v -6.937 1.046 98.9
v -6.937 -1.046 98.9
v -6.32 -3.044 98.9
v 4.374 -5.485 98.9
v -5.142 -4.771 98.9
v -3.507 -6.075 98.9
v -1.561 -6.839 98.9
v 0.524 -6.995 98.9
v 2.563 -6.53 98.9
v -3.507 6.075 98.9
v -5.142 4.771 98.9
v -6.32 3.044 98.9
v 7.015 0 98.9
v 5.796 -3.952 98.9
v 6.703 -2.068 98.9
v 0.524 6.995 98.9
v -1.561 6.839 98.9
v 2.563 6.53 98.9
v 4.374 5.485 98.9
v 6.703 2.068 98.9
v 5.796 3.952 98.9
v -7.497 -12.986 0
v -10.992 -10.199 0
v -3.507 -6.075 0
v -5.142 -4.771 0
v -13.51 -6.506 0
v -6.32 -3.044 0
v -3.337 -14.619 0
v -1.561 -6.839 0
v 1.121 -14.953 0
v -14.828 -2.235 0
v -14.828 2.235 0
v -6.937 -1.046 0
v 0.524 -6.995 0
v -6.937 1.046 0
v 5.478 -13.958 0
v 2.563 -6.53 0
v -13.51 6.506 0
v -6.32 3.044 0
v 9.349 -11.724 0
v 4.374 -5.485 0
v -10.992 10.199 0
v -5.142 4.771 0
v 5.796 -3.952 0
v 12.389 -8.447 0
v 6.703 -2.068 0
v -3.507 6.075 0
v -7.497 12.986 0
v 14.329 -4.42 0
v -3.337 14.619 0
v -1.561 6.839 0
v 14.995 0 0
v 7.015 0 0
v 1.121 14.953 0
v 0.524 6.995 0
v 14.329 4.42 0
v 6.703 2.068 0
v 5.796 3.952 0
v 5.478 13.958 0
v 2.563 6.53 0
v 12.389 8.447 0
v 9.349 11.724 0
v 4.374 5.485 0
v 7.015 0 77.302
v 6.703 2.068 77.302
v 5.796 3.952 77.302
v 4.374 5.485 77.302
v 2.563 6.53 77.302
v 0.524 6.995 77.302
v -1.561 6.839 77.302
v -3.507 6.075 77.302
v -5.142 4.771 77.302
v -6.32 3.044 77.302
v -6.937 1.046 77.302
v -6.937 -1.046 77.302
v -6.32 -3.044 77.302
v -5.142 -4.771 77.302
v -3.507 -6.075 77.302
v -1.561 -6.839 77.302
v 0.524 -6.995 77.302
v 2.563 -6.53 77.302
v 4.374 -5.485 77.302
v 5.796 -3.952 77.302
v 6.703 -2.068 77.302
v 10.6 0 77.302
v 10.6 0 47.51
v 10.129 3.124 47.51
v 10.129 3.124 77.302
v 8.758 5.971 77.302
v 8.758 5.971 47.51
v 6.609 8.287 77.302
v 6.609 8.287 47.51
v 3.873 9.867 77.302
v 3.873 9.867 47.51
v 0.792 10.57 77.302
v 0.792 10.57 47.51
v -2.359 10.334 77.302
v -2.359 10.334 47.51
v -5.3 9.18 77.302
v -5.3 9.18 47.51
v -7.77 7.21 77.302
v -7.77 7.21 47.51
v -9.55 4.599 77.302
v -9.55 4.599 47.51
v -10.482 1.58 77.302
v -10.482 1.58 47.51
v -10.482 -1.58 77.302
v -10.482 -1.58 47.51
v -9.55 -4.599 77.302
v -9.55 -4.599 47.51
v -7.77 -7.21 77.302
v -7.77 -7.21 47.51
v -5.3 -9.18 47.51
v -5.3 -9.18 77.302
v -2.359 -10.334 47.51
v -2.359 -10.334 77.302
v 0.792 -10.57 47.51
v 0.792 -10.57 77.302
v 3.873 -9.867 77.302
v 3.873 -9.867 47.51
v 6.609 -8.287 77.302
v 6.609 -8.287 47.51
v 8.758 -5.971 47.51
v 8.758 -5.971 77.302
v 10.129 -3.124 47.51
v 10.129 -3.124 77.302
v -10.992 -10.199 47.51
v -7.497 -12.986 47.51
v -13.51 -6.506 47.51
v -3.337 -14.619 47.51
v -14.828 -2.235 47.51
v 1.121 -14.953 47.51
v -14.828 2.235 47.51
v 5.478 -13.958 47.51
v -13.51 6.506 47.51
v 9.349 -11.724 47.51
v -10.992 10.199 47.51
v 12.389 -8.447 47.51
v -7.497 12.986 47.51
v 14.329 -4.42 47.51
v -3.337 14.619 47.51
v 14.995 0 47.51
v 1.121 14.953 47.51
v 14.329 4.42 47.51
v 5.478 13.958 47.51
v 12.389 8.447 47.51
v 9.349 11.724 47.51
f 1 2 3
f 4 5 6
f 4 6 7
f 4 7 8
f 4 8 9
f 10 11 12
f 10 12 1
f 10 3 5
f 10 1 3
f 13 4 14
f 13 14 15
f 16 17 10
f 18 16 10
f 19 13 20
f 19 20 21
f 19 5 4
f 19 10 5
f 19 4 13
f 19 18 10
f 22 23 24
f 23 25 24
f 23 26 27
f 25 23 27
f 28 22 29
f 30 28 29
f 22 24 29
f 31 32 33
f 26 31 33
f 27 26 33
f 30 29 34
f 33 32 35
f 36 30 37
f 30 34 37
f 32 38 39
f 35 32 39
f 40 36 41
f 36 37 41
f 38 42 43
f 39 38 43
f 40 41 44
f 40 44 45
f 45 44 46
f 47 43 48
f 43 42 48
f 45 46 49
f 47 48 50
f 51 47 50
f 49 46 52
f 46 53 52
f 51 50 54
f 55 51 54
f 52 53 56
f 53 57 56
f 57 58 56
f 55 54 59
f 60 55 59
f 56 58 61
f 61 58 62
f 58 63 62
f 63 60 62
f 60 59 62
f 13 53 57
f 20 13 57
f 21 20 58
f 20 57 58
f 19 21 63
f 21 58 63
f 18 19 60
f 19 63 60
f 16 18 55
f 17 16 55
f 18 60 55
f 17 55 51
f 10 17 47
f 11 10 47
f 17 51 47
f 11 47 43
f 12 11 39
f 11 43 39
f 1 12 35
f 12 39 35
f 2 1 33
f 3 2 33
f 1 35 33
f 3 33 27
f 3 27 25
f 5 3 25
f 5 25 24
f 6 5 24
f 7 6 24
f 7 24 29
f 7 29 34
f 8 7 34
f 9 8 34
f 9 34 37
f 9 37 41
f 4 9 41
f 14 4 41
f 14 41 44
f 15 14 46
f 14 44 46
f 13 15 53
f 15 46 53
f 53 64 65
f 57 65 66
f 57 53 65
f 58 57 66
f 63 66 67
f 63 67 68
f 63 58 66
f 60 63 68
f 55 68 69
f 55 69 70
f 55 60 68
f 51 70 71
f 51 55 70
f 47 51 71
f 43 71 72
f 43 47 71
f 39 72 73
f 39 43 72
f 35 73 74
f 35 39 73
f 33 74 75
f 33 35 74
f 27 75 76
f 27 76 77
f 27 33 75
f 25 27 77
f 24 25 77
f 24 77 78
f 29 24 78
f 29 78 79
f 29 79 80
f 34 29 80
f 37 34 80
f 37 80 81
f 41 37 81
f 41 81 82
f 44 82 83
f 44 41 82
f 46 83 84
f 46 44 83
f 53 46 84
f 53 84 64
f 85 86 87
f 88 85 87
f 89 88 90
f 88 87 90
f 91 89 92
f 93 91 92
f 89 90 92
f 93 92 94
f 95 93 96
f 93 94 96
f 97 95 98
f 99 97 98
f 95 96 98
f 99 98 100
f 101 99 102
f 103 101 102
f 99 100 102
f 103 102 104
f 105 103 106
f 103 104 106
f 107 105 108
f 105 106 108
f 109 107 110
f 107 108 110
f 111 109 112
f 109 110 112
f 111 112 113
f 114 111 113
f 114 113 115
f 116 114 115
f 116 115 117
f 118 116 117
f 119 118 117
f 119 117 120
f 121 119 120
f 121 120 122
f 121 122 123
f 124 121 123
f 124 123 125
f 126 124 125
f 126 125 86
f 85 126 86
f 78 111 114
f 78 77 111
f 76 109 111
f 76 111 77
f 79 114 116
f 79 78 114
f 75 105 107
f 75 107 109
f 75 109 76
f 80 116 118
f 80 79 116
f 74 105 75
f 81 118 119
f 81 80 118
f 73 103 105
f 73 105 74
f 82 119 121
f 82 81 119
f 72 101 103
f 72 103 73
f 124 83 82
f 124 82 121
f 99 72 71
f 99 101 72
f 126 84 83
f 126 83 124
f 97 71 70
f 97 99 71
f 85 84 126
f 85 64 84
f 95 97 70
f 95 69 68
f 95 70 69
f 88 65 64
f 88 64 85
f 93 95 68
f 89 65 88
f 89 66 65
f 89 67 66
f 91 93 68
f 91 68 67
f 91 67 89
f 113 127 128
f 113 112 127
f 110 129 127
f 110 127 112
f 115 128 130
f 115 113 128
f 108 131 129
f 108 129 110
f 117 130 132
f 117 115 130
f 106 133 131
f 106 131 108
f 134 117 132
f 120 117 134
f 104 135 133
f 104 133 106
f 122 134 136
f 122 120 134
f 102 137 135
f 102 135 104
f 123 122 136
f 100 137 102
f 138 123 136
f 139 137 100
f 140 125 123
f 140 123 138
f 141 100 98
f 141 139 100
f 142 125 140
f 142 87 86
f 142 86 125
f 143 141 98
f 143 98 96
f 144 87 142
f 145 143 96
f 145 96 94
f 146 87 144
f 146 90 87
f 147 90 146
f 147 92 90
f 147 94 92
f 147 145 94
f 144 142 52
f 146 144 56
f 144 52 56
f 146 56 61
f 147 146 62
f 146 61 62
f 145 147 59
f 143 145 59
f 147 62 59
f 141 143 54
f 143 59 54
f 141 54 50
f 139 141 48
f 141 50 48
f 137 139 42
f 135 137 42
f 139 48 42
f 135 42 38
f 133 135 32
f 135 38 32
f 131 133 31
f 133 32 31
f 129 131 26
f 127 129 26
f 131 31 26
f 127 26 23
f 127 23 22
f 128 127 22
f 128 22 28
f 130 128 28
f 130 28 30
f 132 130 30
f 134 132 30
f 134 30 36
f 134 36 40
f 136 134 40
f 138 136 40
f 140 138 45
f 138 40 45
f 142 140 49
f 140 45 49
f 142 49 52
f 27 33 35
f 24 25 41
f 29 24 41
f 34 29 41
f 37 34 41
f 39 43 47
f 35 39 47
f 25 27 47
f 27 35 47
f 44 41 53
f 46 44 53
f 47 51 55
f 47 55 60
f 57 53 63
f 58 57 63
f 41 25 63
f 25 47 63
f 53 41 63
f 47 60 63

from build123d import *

# Parameters (mm, degrees)
F0_R     = 14.9949916
F0_R_2   = 10.5999915
F1_DEPTH = 47.50999896
F0_R_3   = 7.01499994
F2_DEPTH = 98.9000054
F3_DEPTH = 77.301598


with BuildPart() as f1:
    # F0 (on Top) → F1 (new body)
    with BuildSketch(Plane.XY):
        Circle(F0_R)
        Circle(F0_R_2, mode=Mode.SUBTRACT)
    extrude(amount=F1_DEPTH)

    # F0 (on Top) → F3 (join)
    with BuildSketch(Plane.XY):
        Circle(F0_R_2)
        Circle(F0_R_3, mode=Mode.SUBTRACT)
    extrude(amount=F3_DEPTH)


with BuildPart() as f2:
    # F0 (on Top) → F2 (new body)
    with BuildSketch(Plane.XY):
        Circle(F0_R_3)
    extrude(amount=F2_DEPTH)


solid = Compound([f1.part, f2.part])
